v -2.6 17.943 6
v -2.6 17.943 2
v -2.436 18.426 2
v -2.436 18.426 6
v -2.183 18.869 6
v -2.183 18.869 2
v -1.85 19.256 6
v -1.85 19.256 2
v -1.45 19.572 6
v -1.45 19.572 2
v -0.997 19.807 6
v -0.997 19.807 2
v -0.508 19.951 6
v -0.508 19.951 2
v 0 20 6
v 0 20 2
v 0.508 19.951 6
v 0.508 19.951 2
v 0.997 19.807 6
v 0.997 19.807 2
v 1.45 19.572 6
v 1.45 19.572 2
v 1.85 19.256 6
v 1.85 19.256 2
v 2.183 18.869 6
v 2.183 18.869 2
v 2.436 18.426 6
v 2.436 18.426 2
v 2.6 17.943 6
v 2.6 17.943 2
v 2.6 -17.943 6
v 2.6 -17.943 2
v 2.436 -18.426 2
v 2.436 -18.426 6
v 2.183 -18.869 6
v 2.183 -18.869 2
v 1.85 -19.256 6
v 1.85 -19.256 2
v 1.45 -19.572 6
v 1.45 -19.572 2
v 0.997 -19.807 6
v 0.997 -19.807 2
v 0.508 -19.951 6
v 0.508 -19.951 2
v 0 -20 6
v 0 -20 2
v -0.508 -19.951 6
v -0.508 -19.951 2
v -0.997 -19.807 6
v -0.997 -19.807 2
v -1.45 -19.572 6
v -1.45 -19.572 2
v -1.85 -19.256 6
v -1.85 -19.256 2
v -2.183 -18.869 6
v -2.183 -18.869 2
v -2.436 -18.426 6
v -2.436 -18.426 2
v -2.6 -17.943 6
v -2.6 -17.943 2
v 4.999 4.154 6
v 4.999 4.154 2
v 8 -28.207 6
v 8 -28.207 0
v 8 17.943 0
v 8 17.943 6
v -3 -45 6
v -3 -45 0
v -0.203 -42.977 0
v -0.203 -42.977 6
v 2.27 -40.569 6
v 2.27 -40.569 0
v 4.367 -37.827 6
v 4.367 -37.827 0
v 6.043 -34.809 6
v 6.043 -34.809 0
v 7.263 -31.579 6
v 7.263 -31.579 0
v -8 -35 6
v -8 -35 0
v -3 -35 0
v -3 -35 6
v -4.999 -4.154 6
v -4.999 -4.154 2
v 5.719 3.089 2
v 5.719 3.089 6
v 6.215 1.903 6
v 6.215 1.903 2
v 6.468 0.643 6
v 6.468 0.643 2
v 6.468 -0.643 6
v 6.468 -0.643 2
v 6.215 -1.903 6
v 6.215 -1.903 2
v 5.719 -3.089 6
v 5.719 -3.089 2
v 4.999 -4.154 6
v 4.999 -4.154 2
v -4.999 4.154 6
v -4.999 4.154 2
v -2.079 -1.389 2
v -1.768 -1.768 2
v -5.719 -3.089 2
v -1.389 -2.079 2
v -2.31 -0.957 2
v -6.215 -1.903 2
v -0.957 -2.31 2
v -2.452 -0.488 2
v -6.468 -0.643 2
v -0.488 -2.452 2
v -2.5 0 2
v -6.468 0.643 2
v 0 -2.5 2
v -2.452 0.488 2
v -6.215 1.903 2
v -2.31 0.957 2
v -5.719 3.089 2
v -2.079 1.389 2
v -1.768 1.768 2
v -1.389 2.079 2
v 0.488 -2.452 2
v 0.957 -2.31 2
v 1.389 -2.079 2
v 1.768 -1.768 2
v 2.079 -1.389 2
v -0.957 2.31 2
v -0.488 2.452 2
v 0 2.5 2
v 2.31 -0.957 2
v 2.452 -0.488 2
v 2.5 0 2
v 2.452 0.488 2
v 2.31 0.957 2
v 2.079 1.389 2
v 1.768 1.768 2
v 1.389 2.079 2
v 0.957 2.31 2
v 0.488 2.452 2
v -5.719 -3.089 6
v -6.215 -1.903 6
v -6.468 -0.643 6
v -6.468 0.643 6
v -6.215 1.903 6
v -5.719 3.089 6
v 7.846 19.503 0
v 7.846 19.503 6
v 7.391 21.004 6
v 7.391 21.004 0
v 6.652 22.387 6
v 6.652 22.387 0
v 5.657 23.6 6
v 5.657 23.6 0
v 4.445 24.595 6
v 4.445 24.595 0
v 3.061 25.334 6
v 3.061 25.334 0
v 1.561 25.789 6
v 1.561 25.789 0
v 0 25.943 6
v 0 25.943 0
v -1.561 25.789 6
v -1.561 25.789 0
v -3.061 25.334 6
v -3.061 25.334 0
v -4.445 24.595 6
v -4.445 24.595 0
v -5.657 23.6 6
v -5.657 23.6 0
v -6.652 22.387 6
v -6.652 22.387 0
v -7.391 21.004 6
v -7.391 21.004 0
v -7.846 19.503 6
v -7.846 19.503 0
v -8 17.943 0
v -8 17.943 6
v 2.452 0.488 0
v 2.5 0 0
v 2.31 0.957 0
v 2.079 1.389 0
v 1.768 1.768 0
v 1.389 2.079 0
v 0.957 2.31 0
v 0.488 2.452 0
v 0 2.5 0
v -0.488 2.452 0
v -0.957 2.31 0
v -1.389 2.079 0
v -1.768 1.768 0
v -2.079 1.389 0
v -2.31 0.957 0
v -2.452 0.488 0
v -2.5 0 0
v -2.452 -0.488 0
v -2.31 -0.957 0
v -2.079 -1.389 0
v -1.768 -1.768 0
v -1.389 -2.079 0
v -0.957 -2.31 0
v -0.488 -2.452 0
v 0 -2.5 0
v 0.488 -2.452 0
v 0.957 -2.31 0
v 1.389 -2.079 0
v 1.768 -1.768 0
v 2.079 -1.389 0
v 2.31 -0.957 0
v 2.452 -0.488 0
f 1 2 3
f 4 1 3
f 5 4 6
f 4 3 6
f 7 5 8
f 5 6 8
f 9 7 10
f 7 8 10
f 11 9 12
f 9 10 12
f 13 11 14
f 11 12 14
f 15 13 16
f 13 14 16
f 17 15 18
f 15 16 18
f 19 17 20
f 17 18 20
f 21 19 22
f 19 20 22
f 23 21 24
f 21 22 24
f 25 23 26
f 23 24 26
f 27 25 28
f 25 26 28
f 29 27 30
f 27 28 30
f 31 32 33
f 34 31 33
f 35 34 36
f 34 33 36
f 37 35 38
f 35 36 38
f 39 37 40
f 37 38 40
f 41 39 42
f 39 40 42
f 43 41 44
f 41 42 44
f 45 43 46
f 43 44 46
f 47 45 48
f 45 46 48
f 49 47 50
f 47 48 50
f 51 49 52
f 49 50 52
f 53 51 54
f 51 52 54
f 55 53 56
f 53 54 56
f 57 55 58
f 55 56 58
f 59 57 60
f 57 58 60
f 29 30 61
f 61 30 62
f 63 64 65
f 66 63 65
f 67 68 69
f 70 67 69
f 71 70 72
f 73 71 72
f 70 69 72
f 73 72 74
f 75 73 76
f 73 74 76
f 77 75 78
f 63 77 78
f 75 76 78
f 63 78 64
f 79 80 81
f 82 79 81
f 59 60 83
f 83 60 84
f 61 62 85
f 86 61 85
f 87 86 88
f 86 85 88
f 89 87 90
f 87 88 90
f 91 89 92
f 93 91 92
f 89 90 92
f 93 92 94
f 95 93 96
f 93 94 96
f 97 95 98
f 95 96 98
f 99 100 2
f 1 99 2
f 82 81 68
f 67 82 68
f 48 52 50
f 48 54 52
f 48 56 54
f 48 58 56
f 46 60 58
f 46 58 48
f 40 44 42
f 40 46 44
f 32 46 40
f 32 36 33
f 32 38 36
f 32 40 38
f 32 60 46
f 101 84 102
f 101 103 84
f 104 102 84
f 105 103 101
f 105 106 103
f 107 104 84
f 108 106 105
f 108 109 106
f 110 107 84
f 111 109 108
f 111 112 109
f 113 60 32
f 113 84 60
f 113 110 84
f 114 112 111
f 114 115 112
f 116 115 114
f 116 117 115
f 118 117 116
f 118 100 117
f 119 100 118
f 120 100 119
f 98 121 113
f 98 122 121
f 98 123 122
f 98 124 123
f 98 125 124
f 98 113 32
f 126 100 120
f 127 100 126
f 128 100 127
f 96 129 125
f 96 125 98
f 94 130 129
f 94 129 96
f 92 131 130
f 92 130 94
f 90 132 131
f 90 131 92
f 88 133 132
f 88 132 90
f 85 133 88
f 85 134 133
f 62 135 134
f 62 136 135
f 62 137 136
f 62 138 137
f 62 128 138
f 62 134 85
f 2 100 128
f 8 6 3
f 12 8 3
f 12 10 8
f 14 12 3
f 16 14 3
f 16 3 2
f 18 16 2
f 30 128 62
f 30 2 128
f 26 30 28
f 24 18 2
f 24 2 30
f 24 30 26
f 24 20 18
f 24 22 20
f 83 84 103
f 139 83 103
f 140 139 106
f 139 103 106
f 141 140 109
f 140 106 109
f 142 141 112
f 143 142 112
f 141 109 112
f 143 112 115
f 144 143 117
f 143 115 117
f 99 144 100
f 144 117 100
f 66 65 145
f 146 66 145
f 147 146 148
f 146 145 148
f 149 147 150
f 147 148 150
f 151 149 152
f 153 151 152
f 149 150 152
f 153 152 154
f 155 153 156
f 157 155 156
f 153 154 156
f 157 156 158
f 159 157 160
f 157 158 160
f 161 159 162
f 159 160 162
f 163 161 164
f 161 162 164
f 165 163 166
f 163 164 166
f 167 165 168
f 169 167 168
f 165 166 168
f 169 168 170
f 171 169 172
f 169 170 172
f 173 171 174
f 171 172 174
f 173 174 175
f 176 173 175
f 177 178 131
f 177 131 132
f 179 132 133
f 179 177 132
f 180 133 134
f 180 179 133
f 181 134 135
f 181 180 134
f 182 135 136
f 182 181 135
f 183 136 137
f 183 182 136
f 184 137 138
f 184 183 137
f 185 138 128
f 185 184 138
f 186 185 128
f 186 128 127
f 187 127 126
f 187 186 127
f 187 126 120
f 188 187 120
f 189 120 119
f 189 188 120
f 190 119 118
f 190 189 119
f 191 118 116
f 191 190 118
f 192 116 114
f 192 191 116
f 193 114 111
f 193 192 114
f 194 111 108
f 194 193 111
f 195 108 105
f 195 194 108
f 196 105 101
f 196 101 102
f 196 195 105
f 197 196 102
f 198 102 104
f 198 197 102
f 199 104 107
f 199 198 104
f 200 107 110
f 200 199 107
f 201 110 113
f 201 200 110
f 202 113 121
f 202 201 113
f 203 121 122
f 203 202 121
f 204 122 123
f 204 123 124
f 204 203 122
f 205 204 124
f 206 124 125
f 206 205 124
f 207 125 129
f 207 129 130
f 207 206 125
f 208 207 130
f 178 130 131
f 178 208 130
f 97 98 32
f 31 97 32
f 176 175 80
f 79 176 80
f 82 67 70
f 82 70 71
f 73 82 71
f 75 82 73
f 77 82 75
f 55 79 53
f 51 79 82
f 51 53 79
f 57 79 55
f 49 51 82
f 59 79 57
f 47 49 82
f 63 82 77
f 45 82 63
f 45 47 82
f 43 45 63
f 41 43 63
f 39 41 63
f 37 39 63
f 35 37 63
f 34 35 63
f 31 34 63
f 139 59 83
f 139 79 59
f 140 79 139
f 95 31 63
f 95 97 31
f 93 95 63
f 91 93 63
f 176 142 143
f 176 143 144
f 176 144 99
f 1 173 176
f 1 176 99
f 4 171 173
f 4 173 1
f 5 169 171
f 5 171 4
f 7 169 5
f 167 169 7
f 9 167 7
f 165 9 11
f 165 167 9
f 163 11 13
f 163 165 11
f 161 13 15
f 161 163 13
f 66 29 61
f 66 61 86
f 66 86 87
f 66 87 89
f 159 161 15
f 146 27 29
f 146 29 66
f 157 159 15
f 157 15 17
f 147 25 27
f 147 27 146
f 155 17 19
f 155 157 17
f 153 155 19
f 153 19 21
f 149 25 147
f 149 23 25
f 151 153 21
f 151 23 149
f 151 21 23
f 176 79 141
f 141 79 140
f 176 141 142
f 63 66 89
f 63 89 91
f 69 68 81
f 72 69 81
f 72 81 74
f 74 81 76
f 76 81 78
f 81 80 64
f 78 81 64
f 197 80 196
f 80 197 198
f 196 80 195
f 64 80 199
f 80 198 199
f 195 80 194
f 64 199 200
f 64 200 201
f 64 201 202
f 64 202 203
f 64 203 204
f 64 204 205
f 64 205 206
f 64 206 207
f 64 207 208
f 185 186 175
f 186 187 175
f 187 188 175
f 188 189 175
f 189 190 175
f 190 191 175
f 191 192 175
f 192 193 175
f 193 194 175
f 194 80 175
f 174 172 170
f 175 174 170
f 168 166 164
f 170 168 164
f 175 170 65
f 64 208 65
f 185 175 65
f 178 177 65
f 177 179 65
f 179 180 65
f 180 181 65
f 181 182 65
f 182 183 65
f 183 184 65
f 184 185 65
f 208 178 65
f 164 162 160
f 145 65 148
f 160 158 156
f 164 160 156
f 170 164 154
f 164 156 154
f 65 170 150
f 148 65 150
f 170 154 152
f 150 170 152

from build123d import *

# Parameters (mm, degrees)
EXTRUDE_1_DEPTH = 6
SKETCH_2_W      = 13.679492917
SKETCH_2_H      = 41.038478751
SKETCH_2_R      = 2.5
EXTRUDE_2_DEPTH = 2


with BuildPart() as part:
    # 草圖1 → 填料-伸長1 (new body)
    with BuildSketch(Plane.XY):
        with BuildLine():
            Line((8, -24.934633195), (8, 17.94275172))
            ThreePointArc((8, 17.94275172), (0, 25.94275172), (-8, 17.94275172))
            Line((-8, 17.94275172), (-8, -18.141285654))
            Line((-8, -18.141285654), (-8, -24.934633195))
            Line((-8, -24.934633195), (-8, -28.206652459))
            Line((-8, -28.206652459), (-8, -35))
            Line((-8, -35), (-3, -35))
            Line((-3, -35), (-3, -45))
            ThreePointArc((-3, -45), (4.367409356, -37.826519096), (8, -28.206652459))
            Line((8, -28.206652459), (8, -24.934633195))
        make_face()
        with BuildLine():
            ThreePointArc((-4.999271035, -4.154189345), (-6.5, 0), (-4.999271035, 4.154189345))
            Line((-4.999271035, 4.154189345), (-2.6, 17.94275172))
            ThreePointArc((-2.6, 17.94275172), (0, 20), (2.6, 17.94275172))
            Line((2.6, 17.94275172), (4.999271035, 4.154189345))
            ThreePointArc((4.999271035, 4.154189345), (6.5, 0), (4.999271035, -4.154189345))
            Line((4.999271035, -4.154189345), (2.6, -17.94275172))
            ThreePointArc((2.6, -17.94275172), (0, -20), (-2.6, -17.94275172))
            Line((-2.6, -17.94275172), (-4.999271035, -4.154189345))
        make_face(mode=Mode.SUBTRACT)
    extrude(amount=EXTRUDE_1_DEPTH)

    # 草圖2 → 填料-伸長2 (add)
    with BuildSketch(Plane.XY):
        with Locations((0.193072501, -0.109084802)):
            Rectangle(SKETCH_2_W, SKETCH_2_H)
        Circle(SKETCH_2_R, mode=Mode.SUBTRACT)
    extrude(amount=EXTRUDE_2_DEPTH)


solid = part.part
